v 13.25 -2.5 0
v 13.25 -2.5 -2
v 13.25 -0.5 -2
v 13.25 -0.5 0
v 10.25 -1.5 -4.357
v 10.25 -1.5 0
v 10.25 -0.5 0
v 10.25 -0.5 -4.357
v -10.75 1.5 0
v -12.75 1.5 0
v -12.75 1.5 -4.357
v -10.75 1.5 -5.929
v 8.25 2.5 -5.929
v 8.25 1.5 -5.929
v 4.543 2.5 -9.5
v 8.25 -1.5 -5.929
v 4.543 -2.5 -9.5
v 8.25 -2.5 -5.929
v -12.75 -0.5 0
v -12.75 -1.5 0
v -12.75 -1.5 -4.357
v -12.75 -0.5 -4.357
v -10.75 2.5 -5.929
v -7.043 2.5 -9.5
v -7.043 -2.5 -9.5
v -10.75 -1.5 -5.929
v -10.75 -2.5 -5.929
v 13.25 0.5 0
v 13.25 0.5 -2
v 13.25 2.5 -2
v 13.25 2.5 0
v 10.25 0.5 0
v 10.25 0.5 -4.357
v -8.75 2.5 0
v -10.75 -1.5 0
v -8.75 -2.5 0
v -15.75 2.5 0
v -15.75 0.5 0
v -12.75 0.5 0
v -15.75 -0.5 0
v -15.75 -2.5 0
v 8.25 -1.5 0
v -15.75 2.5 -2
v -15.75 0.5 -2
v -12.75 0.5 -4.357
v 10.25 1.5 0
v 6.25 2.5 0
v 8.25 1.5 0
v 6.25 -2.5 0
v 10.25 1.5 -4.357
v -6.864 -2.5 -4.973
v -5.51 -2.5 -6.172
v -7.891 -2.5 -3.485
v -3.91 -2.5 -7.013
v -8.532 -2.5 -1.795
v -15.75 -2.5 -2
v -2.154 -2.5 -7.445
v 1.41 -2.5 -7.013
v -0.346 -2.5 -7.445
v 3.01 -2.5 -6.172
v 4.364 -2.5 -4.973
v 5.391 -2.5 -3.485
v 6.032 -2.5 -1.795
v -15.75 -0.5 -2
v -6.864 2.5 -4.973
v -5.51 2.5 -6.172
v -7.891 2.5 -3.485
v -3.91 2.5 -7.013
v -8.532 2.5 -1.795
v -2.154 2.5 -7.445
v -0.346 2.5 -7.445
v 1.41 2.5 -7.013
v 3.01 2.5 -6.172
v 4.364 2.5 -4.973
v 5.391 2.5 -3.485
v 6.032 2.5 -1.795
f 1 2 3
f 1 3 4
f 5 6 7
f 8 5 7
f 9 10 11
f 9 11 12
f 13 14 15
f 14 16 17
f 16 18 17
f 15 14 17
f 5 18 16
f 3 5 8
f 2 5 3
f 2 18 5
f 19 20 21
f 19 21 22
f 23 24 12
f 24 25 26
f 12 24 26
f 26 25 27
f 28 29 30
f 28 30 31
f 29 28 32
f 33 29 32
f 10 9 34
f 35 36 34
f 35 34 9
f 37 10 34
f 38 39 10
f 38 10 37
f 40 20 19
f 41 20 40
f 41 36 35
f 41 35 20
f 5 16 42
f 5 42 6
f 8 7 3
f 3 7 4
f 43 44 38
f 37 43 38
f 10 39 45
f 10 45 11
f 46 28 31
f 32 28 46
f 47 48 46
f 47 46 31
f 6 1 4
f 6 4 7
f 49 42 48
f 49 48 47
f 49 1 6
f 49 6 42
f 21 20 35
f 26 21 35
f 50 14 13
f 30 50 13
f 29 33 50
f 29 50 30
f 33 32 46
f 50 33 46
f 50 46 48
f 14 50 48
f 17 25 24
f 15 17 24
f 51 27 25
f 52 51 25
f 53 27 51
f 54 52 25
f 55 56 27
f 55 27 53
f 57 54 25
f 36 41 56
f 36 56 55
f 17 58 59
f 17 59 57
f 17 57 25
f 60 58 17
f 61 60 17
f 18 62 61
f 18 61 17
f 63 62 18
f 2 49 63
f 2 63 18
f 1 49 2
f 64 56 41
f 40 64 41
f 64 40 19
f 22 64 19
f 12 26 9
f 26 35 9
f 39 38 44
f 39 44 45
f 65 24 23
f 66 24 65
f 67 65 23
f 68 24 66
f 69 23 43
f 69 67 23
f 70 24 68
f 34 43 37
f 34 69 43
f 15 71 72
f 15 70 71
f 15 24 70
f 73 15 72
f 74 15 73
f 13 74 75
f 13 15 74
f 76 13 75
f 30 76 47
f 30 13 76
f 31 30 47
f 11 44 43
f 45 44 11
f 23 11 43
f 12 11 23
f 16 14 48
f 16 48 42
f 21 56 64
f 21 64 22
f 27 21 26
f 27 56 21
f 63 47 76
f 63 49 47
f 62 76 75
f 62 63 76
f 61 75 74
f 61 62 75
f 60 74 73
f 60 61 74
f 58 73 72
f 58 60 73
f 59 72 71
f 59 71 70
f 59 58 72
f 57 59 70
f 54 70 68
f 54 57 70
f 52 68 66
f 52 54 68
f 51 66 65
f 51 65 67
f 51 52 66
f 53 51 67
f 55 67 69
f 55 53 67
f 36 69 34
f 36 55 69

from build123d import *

# Parameters (mm, degrees)
F0_W      = 5
F0_H      = 2
F1_DEPTH  = 2.5
F5_DEPTH  = 5
F6_W      = 3
F6_H      = 1
F6_W_2    = 2
F7_DEPTH  = 25
F8_DEPTH  = 25
F9_DEPTH  = 19
F11_DEPTH = 25


with BuildPart() as f1:
    # F0 (on Front) → F1 (new body, symmetric)
    with BuildSketch(Plane.XZ):
        with BuildLine():
            ThreePointArc((6.25, 0), (-1.25, -7.5), (-8.75, 0))
            Line((-8.75, 0), (-10.75, 0))
            ThreePointArc((-10.75, 0), (-7.9675144213, -6.7175144213), (-1.25, -9.5))
            ThreePointArc((-1.25, -9.5), (5.4675144213, -6.7175144213), (8.25, 0))
            Line((8.25, 0), (6.25, 0))
        make_face()
        with BuildLine():
            ThreePointArc((-1.25, -9.5), (-7.9675144213, -6.7175144213), (-10.75, 0))
            Line((-10.75, 0), (-10.75, -2))
            Line((-10.75, -2), (-10.75, -9.5))
            Line((-10.75, -9.5), (-1.25, -9.5))
        make_face()
        with Locations((-13.25, -1)):
            Rectangle(F0_W, F0_H)
        with BuildLine():
            Line((8.25, -2), (8.25, 0))
            ThreePointArc((8.25, 0), (5.4675144213, -6.7175144213), (-1.25, -9.5))
            Line((-1.25, -9.5), (8.25, -9.5))
            Line((8.25, -9.5), (8.25, -2))
        make_face()
        with Locations((10.75, -1)):
            Rectangle(F0_W, F0_H)
    extrude(amount=F1_DEPTH, both=True)

    # F4 (on face) → F5 (join, through all)
    with BuildSketch(Plane.XZ.offset(2.5)):
        Polygon((-10.75, -2), (-15.75, -2), (-10.75, -5.9285714286), align=None)
        Polygon((8.25, -5.9285714286), (13.25, -2), (8.25, -2), align=None)
    extrude(amount=-F5_DEPTH)

    # F6 (on face) → F7 (cut)
    with BuildSketch(Plane.XY):
        with Locations((-14.25, 0)):
            Rectangle(F6_W, F6_H)
        with Locations((-11.75, 1)):
            Rectangle(F6_W_2, F6_H)
        with Locations((-11.75, 0)):
            Rectangle(F6_W_2, F6_H)
        with Locations((-11.75, -1)):
            Rectangle(F6_W_2, F6_H)
        Polygon((13.25, -0.500000013), (13.25, 0.499999987), (10.2499989308, 0.499999987), (10.2499989308, 1.499999987), (8.2499989308, 1.499999987), (8.2499989308, -1.500000013), (10.2499989308, -1.500000013), (10.2499989308, -0.500000013), align=None)
    extrude(amount=-F7_DEPTH, mode=Mode.SUBTRACT)

    # F3 (on face) → F8 (cut)
    with BuildSketch(Plane.YZ.offset(8.25)):
        Polygon((2.5, -9.5), (2.5, -8.1602540378), (-2.5, -9.5), align=None)
    extrude(amount=-F8_DEPTH, mode=Mode.SUBTRACT)

    # F3 (on face) → F9 (join, through all)
    with BuildSketch(Plane.YZ.offset(8.25)):
        Polygon((2.5, -9.5), (2.5, -8.1602540378), (-2.5, -9.5), align=None)
    extrude(amount=-F9_DEPTH)

    # F10 (on face) → F11 (cut)
    with BuildSketch(Plane.XZ.offset(2.5)):
        Polygon((-10.75, -9.5), (-7.04318, -9.5), (-10.75, -5.9285714286), align=None)
        Polygon((8.25, -5.9285714286), (4.54318, -9.5), (8.25, -9.5), align=None)
    extrude(amount=-F11_DEPTH, mode=Mode.SUBTRACT)


solid = f1.part
